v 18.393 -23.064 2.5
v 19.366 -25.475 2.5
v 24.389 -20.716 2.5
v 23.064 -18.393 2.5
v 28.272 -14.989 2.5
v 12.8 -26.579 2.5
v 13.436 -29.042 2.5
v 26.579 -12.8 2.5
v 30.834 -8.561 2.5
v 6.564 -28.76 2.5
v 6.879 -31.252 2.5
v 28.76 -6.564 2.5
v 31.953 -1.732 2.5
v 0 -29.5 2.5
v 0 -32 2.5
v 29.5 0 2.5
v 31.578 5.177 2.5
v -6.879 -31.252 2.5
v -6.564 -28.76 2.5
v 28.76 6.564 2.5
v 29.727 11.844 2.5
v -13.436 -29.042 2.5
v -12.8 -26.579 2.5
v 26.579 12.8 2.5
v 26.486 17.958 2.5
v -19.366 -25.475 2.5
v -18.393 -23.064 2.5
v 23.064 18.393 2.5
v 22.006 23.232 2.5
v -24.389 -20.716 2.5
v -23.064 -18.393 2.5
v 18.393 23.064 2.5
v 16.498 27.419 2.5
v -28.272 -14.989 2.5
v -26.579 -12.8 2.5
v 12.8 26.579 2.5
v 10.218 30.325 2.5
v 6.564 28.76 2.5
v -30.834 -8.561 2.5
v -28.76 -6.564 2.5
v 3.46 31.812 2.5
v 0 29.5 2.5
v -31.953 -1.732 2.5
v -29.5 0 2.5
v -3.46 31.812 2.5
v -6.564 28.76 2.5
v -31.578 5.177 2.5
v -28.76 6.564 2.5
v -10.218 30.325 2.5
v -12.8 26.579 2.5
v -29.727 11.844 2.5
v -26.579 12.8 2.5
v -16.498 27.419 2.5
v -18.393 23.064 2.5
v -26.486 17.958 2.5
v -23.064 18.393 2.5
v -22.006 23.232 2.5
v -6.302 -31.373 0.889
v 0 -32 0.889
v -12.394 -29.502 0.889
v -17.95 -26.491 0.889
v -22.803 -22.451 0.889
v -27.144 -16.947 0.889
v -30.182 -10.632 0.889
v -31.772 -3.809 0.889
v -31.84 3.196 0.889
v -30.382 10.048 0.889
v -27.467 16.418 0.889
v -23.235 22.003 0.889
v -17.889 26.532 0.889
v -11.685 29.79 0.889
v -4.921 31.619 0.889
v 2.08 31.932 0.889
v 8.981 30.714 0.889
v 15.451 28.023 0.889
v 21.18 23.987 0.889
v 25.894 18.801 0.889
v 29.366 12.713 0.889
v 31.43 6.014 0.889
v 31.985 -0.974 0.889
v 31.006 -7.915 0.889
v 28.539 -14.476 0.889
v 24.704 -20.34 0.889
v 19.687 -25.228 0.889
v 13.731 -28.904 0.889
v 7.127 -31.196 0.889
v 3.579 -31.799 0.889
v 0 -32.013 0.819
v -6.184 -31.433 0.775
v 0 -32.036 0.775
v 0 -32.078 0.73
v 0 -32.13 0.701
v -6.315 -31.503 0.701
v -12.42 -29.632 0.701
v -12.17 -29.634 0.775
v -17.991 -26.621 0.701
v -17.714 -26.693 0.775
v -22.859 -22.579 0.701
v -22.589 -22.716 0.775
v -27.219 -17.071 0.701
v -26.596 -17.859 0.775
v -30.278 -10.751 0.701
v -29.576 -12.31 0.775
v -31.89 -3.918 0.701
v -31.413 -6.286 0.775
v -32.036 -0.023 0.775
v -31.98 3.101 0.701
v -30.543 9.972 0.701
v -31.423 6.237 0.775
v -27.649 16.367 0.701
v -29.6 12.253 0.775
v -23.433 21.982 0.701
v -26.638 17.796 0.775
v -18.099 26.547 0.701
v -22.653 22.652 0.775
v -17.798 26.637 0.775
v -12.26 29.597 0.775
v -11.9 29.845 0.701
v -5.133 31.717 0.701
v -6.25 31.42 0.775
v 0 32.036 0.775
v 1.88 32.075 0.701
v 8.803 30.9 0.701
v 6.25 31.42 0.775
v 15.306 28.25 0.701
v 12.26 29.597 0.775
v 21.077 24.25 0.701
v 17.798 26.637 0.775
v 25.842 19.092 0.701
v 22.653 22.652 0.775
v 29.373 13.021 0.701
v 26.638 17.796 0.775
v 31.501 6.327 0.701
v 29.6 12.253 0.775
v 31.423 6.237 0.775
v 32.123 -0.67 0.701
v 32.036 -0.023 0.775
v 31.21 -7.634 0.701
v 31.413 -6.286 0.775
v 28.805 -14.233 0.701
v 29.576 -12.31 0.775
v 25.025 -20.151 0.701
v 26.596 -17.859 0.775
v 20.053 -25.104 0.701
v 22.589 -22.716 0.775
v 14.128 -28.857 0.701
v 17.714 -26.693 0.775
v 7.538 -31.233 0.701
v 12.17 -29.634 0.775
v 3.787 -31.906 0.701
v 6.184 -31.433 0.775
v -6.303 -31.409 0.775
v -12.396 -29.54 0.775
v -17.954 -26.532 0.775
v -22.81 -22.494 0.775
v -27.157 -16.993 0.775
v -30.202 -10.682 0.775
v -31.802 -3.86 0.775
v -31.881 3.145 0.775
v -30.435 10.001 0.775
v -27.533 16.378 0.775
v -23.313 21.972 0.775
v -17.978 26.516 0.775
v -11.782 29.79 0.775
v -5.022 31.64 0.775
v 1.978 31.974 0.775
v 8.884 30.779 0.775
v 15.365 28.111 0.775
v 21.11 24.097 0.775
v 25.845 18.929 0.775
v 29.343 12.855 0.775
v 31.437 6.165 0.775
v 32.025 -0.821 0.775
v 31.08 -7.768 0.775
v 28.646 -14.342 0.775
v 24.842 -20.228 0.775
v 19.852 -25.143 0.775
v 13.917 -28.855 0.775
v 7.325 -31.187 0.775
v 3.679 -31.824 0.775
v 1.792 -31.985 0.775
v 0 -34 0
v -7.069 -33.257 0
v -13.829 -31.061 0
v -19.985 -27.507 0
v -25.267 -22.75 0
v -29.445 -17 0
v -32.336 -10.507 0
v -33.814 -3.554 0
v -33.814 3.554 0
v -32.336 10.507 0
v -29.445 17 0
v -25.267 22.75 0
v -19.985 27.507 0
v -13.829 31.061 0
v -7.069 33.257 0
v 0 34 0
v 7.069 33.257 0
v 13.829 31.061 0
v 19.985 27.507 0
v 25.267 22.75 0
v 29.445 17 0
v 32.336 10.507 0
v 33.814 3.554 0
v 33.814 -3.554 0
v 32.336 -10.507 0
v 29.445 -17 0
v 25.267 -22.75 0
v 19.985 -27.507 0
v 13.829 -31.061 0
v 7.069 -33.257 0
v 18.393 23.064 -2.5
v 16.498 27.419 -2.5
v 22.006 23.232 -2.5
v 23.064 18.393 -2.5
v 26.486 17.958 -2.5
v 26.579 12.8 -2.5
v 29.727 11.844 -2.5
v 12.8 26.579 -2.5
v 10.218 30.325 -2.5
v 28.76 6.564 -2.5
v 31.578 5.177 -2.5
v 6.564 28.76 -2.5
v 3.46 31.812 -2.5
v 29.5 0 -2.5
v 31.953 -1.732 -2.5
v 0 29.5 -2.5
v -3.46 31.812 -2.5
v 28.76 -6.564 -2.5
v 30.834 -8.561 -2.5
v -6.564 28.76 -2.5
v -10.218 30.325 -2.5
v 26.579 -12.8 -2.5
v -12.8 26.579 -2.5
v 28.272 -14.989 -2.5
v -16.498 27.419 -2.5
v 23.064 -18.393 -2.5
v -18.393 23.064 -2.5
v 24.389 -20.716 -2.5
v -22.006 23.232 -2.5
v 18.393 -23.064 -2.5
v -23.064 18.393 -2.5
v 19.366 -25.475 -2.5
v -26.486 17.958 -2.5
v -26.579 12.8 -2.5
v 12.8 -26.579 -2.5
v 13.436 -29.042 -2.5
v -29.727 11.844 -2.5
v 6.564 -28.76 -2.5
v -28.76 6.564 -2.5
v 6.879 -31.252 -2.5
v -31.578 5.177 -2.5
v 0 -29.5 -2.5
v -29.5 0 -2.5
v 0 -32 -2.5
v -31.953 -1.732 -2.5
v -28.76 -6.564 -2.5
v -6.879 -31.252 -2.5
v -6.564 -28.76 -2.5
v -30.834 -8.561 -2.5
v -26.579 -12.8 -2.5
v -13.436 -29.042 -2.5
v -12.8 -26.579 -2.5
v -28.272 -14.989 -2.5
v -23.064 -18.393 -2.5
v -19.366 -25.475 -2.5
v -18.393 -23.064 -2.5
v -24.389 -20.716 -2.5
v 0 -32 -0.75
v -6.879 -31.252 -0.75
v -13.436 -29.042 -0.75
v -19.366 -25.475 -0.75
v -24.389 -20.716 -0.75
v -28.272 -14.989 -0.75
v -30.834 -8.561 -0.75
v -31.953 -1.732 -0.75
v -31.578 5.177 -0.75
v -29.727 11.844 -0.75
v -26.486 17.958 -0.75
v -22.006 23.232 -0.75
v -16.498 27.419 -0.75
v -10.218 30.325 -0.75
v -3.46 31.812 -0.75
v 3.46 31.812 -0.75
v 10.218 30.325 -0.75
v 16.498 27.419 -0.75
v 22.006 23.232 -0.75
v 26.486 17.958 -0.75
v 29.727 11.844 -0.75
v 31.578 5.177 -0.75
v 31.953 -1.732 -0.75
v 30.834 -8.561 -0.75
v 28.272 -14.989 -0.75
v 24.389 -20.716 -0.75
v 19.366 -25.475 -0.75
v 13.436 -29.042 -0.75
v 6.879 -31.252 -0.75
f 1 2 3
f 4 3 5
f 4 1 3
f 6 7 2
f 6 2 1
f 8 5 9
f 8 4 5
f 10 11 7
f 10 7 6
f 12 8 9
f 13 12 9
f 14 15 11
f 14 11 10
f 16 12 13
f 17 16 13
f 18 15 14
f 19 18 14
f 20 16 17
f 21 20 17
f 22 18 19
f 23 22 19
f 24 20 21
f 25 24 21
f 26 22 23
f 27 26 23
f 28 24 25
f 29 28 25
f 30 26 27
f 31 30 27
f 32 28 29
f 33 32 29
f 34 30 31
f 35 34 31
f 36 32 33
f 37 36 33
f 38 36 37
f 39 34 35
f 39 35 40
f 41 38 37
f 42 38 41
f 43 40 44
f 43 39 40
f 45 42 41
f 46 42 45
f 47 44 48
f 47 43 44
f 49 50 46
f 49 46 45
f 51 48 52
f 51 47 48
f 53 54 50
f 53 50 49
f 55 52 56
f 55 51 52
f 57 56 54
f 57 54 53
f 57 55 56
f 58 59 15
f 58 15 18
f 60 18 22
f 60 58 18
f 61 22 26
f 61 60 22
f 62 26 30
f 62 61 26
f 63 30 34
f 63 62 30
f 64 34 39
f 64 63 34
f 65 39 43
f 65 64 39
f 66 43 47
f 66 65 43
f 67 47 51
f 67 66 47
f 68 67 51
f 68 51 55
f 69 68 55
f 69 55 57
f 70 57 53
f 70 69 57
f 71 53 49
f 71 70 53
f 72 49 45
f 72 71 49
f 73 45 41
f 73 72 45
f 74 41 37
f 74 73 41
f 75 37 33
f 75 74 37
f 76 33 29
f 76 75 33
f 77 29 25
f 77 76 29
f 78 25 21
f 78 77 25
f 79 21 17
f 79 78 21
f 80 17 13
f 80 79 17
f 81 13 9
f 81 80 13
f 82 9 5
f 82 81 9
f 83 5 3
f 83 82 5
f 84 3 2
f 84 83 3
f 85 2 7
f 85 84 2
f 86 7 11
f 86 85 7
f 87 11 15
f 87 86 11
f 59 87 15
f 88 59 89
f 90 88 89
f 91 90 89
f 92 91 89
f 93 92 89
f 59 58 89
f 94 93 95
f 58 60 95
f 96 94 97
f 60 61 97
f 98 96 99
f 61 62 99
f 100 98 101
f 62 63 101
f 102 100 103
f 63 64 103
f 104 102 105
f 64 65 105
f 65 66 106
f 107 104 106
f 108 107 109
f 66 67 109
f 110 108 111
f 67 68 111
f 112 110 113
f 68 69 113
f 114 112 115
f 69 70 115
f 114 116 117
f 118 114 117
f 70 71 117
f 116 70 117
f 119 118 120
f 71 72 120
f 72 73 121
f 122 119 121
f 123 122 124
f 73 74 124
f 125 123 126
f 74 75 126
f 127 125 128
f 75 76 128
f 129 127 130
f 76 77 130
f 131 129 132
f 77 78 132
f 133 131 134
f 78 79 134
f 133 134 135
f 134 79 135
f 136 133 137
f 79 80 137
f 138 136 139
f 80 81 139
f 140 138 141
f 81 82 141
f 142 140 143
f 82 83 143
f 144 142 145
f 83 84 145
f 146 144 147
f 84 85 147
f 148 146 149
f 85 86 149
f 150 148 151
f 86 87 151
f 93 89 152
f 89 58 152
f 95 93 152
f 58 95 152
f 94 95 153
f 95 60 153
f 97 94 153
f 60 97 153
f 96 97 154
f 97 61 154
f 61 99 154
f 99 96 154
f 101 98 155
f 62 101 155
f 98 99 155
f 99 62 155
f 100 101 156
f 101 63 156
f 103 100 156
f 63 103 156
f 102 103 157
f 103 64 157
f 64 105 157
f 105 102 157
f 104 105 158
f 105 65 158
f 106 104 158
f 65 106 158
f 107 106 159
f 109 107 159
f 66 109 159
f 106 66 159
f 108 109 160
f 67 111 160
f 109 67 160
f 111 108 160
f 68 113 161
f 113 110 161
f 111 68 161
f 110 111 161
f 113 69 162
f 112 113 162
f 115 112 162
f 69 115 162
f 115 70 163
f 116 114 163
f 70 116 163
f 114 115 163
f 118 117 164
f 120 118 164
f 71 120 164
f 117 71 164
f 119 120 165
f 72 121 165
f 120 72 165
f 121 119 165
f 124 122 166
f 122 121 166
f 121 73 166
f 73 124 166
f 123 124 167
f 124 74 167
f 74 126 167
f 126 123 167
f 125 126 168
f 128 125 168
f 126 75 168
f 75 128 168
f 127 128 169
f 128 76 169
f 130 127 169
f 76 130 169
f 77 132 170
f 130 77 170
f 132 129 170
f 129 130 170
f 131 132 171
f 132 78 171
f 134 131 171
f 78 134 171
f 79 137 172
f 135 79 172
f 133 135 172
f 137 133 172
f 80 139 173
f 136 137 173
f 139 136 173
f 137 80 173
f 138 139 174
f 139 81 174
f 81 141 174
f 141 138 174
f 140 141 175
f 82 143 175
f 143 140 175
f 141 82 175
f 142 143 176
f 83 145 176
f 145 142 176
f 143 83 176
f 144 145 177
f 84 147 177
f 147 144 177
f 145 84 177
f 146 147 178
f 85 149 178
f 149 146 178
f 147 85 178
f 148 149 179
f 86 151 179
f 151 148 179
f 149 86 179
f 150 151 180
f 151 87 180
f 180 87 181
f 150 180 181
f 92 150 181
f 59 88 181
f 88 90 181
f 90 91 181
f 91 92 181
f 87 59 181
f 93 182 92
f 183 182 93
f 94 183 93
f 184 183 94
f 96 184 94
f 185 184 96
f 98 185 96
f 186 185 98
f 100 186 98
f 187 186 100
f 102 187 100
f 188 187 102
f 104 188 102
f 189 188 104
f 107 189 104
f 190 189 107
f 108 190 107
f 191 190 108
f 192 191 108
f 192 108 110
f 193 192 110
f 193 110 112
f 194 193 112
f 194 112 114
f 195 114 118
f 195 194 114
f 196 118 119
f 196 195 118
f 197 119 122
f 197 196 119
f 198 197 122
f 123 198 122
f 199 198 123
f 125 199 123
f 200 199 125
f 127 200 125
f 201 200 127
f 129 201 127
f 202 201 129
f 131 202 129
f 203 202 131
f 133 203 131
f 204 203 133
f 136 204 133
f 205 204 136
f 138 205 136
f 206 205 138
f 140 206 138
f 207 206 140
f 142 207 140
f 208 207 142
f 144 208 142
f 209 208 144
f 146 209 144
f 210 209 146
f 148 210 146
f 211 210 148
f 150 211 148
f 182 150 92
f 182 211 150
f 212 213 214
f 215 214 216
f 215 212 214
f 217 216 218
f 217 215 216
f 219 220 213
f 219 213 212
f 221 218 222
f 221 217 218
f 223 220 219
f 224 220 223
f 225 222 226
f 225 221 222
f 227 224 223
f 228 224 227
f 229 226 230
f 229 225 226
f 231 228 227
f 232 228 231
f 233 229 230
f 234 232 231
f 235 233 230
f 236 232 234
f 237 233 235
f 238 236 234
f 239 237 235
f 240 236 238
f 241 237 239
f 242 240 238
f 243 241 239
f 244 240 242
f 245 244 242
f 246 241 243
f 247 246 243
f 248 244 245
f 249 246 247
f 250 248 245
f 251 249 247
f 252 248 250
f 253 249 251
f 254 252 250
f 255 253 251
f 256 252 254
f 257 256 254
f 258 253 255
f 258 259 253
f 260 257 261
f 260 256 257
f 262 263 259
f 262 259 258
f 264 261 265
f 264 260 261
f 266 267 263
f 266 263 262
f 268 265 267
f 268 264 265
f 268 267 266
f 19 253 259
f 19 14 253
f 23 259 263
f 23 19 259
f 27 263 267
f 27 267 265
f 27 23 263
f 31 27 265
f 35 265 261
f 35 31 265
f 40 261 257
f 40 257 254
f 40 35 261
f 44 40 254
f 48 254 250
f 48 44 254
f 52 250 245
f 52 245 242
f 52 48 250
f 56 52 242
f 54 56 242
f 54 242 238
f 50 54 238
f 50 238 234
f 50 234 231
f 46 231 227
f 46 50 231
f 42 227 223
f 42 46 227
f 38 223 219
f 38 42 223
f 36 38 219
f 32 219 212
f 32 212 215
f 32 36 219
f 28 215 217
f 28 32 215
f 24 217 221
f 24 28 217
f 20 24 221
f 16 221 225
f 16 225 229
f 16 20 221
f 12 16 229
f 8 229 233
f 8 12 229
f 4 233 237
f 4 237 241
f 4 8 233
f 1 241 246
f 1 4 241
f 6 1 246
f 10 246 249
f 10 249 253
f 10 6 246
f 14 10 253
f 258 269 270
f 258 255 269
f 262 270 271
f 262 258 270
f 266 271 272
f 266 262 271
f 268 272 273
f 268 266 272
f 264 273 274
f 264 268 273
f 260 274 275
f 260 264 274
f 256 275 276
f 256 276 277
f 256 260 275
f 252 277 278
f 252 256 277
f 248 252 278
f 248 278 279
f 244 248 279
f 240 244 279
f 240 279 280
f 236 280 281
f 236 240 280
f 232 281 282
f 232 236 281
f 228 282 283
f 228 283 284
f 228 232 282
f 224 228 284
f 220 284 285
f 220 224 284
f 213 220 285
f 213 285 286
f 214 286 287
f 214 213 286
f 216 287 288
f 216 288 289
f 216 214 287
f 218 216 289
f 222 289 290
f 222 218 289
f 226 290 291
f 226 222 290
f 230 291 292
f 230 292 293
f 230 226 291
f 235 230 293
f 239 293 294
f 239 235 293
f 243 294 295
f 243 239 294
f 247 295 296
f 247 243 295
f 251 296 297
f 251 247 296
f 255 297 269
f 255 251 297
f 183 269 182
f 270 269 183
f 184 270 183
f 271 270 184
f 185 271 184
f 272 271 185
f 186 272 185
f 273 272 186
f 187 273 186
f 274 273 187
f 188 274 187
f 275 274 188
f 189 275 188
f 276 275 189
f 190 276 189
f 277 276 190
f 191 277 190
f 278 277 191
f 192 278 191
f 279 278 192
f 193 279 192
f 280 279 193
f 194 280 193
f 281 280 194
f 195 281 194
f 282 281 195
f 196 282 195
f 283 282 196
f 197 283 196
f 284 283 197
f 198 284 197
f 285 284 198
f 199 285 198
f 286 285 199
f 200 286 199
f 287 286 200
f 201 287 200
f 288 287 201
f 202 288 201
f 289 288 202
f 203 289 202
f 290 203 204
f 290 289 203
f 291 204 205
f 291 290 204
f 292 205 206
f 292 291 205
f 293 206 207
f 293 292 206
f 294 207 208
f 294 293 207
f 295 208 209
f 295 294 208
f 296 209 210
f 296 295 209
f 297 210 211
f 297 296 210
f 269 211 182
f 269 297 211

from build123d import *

# Parameters (mm, degrees)
F3_R = 0.2


with BuildPart() as f2:
    # F1 (on Right) → F2 (revolve)
    with BuildSketch(Plane.YZ):
        Polygon((-29.5, -2.5), (-29.5, 2.5), (-32, 2.5), (-32, 0.75), (-32, -0.75), (-32, -2.5), align=None)
        Polygon((-32, -0.75), (-32, 0.75), (-34, 0), align=None)
    revolve(axis=Axis((0, 0, 0.223784), (0, 0, -1)))

    # F3
    f3_edges = [f2.edges().sort_by_distance(p)[0] for p in [
        (0, 32, 0.75),
    ]]
    fillet(f3_edges, radius=F3_R)


solid = f2.part
